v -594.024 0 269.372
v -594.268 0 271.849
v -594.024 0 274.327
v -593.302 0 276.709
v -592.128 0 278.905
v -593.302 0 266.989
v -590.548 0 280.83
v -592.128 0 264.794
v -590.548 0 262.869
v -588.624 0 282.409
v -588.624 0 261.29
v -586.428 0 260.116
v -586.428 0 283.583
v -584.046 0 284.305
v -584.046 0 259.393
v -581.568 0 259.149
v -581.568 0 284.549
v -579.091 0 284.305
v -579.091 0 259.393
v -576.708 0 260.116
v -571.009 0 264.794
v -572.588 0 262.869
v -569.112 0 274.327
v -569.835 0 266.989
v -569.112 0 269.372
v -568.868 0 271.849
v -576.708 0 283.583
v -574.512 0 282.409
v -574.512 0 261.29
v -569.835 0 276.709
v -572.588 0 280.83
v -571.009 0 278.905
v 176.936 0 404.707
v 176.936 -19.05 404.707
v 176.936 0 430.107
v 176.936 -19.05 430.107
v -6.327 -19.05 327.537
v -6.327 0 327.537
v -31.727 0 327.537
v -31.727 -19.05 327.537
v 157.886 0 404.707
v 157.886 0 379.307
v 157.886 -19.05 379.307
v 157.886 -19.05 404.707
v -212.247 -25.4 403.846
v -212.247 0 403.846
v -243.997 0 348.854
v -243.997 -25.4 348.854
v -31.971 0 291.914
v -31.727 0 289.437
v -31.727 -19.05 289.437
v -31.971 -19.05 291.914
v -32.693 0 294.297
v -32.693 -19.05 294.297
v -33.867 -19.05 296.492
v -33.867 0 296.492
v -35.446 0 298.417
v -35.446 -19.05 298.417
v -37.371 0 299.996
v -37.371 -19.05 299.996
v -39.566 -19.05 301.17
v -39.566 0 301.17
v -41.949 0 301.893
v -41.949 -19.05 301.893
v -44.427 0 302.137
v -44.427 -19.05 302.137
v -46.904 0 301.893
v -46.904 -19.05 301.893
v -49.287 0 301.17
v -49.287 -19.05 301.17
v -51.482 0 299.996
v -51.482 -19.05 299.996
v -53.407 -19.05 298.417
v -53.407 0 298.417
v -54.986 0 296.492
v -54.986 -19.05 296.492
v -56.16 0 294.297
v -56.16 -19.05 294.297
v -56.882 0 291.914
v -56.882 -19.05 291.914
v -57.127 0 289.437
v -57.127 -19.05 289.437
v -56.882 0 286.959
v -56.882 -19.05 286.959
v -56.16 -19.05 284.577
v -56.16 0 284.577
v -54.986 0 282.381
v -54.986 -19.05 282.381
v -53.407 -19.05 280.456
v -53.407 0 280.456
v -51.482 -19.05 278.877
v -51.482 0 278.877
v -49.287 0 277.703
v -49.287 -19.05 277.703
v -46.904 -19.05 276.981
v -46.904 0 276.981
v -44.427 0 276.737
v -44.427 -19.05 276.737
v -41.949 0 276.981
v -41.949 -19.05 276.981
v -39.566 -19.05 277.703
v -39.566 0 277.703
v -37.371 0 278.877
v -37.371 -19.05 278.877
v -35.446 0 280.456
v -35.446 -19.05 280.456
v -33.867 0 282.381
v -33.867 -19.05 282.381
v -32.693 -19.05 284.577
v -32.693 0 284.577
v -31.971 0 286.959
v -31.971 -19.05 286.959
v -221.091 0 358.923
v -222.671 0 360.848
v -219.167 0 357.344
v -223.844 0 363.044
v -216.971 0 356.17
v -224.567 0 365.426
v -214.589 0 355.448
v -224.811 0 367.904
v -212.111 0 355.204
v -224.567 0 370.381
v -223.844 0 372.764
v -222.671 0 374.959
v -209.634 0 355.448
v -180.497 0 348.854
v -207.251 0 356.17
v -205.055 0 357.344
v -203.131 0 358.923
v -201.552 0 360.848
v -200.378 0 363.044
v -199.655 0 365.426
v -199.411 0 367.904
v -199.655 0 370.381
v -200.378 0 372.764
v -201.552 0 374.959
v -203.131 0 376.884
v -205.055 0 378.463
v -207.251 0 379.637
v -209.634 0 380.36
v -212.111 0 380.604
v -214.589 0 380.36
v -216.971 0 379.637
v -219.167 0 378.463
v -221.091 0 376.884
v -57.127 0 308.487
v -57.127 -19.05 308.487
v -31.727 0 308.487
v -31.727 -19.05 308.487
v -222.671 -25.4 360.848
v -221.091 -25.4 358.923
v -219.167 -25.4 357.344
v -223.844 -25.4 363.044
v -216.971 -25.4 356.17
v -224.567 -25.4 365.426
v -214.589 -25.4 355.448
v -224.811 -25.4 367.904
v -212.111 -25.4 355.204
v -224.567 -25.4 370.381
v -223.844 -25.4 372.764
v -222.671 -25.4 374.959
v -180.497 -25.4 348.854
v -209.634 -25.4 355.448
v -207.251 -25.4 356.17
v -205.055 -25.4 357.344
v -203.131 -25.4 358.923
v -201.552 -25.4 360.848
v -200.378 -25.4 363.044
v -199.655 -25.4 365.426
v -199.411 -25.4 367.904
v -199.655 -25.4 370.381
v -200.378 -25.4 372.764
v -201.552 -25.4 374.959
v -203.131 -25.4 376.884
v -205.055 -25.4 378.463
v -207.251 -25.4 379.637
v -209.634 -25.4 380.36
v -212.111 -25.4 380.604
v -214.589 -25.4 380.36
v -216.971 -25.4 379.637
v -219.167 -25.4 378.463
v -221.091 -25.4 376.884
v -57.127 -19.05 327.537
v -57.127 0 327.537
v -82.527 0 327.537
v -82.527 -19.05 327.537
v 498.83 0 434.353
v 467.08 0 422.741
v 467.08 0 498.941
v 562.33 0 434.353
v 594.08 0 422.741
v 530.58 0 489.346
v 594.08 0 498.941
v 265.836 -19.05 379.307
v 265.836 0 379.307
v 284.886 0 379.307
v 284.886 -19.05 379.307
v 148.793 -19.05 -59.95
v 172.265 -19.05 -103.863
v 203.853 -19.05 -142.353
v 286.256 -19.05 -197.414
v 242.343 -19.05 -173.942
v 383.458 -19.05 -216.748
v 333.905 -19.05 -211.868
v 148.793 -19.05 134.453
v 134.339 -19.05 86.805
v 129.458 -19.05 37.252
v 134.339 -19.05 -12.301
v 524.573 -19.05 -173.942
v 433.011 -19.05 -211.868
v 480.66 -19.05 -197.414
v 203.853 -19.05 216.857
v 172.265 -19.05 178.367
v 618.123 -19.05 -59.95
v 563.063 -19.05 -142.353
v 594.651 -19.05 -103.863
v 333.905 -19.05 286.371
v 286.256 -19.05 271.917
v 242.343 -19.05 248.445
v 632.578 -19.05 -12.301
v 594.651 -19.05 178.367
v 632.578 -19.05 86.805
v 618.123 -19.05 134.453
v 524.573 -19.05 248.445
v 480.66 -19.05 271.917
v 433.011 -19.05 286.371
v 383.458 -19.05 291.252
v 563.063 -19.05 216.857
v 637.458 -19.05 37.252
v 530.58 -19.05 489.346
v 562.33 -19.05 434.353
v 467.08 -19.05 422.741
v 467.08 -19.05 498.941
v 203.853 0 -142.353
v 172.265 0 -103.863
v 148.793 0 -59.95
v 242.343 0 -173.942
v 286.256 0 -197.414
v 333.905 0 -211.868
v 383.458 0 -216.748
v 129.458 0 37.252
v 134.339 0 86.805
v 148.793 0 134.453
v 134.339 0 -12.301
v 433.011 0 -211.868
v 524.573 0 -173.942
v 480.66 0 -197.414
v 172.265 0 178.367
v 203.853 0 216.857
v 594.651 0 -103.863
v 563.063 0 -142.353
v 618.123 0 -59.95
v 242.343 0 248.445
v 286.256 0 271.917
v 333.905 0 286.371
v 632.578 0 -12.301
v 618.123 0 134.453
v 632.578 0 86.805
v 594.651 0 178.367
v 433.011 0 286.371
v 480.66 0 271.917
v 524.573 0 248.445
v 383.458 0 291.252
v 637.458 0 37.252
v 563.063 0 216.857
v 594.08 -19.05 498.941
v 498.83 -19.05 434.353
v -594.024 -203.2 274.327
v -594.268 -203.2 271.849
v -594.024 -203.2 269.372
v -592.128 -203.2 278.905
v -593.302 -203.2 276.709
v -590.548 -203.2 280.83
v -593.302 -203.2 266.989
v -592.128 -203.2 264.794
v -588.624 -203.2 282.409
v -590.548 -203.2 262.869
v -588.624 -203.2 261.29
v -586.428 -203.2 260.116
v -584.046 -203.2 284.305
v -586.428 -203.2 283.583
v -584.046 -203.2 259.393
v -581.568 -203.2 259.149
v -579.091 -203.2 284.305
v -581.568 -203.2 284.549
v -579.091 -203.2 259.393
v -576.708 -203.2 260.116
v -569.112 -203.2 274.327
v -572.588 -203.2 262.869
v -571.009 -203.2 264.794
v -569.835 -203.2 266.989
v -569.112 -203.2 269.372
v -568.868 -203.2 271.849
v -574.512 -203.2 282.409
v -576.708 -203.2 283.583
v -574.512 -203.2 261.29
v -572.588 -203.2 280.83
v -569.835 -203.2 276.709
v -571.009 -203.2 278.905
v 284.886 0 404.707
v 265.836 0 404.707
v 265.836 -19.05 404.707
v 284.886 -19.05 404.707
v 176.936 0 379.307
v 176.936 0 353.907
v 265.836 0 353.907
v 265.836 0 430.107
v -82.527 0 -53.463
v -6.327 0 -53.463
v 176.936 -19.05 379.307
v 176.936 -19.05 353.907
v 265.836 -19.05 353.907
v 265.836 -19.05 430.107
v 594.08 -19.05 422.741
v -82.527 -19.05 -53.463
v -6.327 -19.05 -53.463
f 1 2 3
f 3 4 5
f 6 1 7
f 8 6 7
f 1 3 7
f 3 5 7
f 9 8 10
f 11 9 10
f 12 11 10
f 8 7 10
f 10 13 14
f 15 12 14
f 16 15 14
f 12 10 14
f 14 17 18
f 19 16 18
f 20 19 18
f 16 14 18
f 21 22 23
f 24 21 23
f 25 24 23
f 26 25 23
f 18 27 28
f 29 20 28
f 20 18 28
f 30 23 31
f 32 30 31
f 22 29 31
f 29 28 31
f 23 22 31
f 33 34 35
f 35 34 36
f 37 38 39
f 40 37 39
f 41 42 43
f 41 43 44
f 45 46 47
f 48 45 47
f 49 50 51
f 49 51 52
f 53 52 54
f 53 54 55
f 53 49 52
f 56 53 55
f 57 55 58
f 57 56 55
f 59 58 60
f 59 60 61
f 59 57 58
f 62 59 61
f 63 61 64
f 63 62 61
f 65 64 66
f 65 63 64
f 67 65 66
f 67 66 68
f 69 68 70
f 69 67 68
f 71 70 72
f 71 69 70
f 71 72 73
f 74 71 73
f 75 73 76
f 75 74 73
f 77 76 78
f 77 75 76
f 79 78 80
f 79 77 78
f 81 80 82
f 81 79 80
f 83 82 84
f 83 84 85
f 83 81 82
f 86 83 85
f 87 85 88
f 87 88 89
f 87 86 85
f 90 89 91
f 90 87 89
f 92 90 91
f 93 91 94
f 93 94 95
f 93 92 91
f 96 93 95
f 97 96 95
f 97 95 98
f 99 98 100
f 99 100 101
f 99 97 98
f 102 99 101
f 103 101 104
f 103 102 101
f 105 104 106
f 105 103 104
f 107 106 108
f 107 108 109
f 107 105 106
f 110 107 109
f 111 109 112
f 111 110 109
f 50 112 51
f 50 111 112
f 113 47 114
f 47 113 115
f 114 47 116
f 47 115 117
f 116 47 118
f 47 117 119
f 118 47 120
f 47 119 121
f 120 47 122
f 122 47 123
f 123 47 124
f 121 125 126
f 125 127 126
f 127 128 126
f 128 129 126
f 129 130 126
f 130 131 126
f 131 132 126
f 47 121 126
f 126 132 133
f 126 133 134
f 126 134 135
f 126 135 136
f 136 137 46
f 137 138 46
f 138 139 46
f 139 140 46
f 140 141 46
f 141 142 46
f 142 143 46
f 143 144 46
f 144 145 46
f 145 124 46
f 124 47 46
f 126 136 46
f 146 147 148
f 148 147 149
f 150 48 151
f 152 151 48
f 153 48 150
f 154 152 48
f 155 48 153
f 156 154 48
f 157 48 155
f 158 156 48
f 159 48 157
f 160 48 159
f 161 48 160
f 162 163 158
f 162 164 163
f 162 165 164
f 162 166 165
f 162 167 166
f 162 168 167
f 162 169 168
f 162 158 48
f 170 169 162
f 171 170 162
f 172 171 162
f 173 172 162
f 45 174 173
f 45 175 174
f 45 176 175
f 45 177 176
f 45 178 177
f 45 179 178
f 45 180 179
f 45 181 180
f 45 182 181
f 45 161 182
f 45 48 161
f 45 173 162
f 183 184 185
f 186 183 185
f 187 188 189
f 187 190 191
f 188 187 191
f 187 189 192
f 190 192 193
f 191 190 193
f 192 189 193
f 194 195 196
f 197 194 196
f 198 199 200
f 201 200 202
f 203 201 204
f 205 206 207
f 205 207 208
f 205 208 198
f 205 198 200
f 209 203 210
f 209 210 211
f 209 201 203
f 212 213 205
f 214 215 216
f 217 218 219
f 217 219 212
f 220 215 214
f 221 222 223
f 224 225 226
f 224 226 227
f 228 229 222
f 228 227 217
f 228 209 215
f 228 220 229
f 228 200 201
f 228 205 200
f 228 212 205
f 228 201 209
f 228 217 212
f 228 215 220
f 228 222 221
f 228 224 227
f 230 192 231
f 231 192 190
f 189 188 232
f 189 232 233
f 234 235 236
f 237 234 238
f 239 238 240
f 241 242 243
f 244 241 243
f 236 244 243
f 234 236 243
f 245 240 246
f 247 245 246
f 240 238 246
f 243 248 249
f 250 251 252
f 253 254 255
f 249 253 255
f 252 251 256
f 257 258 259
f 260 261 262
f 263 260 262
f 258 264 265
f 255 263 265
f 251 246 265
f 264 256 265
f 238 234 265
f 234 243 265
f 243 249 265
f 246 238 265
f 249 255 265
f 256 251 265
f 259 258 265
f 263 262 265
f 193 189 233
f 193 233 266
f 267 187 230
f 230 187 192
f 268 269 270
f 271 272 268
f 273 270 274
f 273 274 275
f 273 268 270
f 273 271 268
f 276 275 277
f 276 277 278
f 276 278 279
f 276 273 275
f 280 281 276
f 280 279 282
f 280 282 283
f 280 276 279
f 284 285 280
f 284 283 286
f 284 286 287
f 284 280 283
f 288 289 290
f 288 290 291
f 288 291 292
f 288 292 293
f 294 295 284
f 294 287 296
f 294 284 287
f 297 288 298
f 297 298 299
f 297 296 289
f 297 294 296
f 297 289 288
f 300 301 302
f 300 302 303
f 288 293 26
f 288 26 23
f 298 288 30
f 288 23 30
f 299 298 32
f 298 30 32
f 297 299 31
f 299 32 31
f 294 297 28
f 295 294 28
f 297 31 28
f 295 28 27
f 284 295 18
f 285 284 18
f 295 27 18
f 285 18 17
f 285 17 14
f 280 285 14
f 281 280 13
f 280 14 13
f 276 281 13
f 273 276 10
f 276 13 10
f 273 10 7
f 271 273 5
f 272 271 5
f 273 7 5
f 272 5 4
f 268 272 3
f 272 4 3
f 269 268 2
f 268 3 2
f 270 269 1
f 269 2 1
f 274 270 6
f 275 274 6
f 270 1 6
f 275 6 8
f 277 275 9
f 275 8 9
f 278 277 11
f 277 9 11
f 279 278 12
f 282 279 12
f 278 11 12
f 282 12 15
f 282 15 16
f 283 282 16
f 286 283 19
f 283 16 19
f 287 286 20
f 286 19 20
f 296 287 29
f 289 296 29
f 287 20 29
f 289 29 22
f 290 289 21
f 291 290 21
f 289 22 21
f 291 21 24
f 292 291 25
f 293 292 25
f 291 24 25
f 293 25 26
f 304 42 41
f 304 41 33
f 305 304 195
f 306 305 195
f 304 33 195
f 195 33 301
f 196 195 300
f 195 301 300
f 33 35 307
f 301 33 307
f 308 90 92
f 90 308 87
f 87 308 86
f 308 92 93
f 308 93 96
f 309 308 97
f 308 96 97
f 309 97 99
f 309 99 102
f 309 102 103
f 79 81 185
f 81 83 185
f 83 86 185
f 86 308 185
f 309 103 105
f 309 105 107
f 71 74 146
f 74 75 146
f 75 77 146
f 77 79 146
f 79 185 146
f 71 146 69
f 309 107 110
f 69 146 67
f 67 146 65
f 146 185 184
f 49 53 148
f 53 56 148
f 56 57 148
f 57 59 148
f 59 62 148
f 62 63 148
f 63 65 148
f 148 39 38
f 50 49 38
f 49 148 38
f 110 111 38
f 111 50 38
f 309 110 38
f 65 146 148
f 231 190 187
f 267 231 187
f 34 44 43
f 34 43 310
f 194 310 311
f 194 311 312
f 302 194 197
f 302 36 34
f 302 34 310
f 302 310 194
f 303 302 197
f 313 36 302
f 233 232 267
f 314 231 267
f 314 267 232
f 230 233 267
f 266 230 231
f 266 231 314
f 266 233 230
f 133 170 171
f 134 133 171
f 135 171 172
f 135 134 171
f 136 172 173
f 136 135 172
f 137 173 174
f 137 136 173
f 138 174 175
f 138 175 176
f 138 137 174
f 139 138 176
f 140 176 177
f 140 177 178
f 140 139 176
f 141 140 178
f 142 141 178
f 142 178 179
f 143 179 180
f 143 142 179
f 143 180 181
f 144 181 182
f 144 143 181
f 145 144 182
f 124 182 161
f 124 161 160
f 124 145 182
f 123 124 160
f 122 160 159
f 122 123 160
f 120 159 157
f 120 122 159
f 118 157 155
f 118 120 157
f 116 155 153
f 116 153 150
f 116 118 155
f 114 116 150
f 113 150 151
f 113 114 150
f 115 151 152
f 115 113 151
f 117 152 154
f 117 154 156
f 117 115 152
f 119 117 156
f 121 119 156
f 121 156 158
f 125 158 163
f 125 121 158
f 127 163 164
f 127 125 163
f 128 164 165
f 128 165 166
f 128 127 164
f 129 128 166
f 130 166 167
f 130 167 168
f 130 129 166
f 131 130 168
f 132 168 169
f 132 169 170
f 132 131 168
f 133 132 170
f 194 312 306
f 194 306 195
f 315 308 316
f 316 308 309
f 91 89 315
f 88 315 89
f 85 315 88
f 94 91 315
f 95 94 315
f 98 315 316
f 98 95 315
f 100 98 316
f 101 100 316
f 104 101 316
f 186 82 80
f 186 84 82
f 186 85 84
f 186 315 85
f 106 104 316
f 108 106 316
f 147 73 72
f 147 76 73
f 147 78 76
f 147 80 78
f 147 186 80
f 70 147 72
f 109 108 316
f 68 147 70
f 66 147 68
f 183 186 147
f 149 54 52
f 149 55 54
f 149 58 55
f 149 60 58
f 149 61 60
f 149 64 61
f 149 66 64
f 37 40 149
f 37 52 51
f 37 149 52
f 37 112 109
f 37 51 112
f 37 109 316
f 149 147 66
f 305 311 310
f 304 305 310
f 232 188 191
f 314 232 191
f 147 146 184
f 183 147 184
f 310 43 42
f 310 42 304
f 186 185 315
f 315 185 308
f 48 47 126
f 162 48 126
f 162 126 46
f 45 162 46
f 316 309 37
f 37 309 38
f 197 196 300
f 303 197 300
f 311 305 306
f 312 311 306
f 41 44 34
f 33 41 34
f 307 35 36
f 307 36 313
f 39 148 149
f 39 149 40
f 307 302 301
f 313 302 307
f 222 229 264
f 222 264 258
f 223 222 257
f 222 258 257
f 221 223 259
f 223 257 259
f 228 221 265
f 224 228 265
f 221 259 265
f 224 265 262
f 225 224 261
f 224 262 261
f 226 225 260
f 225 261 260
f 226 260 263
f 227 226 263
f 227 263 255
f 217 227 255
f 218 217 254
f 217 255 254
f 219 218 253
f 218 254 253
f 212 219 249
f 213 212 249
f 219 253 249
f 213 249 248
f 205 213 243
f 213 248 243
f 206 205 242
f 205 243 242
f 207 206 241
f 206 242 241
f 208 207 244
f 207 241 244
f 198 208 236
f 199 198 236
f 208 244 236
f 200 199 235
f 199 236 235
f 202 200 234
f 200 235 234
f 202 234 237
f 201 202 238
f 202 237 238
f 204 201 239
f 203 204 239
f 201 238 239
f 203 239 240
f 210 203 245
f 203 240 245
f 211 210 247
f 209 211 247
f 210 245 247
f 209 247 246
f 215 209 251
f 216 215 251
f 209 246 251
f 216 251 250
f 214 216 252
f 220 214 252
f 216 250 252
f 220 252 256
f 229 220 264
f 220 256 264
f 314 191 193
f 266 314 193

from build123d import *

# Parameters (mm, degrees)
F0_R      = 12.7
F1_DEPTH  = 19.05
F2_W      = 127
F2_H      = 76.2
F3_DEPTH  = 19.05
F4_R      = 254
F5_DEPTH  = 19.05
F6_W      = 127
F6_H      = 76.2
F7_DEPTH  = 19.05
F8_W      = 25.4
F8_H      = 19.05
F9_DEPTH  = 25.4
F10_W     = 19.05
F10_H     = 25.4
F11_DEPTH = 25.4
F12_R     = 12.7
F13_DEPTH = 25.4
F14_R     = 12.7
F15_DEPTH = 203.2


with BuildPart() as f1:
    # F0 (on Front) → F1 (new body)
    with BuildSketch(Plane.XZ):
        Polygon((-69.826509, 327.536668), (-82.526509, 327.536668), (-82.526509, 308.486668), (-69.826509, 308.486668), (-57.126509, 308.486668), (-57.126509, 327.536668), align=None)
        Polygon((-69.826509, 308.486668), (-82.526509, 308.486668), (-82.526509, -53.463332), (-6.326509, -53.463332), (-6.326509, 308.486668), (-19.026509, 308.486668), (-31.726509, 308.486668), (-44.426509, 308.486668), (-57.126509, 308.486668), align=None)
        with Locations((-44.426509, 289.436668)):
            Circle(F0_R, mode=Mode.SUBTRACT)
        Polygon((-44.426509, 327.536668), (-57.126509, 327.536668), (-57.126509, 308.486668), (-44.426509, 308.486668), (-31.726509, 308.486668), (-31.726509, 327.536668), align=None)
        Polygon((-19.026509, 327.536668), (-31.726509, 327.536668), (-31.726509, 308.486668), (-19.026509, 308.486668), (-6.326509, 308.486668), (-6.326509, 327.536668), align=None)
    extrude(amount=F1_DEPTH)

    # F8 (on face) → F9 (cut)
    with BuildSketch(Plane.XZ.offset(19.05)):
        with Locations((-44.426509, 318.011668)):
            Rectangle(F8_W, F8_H)
    extrude(amount=-F9_DEPTH, mode=Mode.SUBTRACT)


with BuildPart() as f3:
    # F2 (on Front) → F3 (new body)
    with BuildSketch(Plane.XZ):
        with Locations((221.385913, 392.006751)):
            Rectangle(F2_W, F2_H)
    extrude(amount=F3_DEPTH)

    # F10 (on face) → F11 (cut)
    with BuildSketch(Plane.XZ.offset(19.05)):
        with Locations((167.410913, 417.406751)):
            Rectangle(F10_W, F10_H)
        with Locations((167.410913, 366.606751)):
            Rectangle(F10_W, F10_H)
        with Locations((275.360913, 366.606751)):
            Rectangle(F10_W, F10_H)
        with Locations((275.360913, 417.406751)):
            Rectangle(F10_W, F10_H)
    extrude(amount=-F11_DEPTH, mode=Mode.SUBTRACT)


with BuildPart() as f5:
    # F4 (on Front) → F5 (new body)
    with BuildSketch(Plane.XZ):
        with Locations((383.458091, 37.251746)):
            Circle(F4_R)
    extrude(amount=F5_DEPTH)


with BuildPart() as f7:
    # F6 (on Front) → F7 (new body)
    with BuildSketch(Plane.XZ):
        with Locations((530.57965, 460.841115)):
            Rectangle(F6_W, F6_H)
        Polygon((562.32965, 434.353173), (498.82965, 434.353173), (530.57965, 489.345786), align=None, mode=Mode.SUBTRACT)
    extrude(amount=F7_DEPTH)


with BuildPart() as f13:
    # F12 (on Front) → F13 (new body)
    with BuildSketch(Plane.XZ):
        Polygon((-212.246575, 403.846291), (-243.996575, 348.853678), (-180.496575, 348.853678), align=None)
        with Locations((-212.111169, 367.903678)):
            Circle(F12_R, mode=Mode.SUBTRACT)
    extrude(amount=F13_DEPTH)


with BuildPart() as f15:
    # F14 (on Front) → F15 (new body)
    with BuildSketch(Plane.XZ):
        with Locations((-581.568241, 271.849304)):
            Circle(F14_R)
    extrude(amount=F15_DEPTH)


solid = Compound([f1.part, f3.part, f5.part, f7.part, f13.part, f15.part])
